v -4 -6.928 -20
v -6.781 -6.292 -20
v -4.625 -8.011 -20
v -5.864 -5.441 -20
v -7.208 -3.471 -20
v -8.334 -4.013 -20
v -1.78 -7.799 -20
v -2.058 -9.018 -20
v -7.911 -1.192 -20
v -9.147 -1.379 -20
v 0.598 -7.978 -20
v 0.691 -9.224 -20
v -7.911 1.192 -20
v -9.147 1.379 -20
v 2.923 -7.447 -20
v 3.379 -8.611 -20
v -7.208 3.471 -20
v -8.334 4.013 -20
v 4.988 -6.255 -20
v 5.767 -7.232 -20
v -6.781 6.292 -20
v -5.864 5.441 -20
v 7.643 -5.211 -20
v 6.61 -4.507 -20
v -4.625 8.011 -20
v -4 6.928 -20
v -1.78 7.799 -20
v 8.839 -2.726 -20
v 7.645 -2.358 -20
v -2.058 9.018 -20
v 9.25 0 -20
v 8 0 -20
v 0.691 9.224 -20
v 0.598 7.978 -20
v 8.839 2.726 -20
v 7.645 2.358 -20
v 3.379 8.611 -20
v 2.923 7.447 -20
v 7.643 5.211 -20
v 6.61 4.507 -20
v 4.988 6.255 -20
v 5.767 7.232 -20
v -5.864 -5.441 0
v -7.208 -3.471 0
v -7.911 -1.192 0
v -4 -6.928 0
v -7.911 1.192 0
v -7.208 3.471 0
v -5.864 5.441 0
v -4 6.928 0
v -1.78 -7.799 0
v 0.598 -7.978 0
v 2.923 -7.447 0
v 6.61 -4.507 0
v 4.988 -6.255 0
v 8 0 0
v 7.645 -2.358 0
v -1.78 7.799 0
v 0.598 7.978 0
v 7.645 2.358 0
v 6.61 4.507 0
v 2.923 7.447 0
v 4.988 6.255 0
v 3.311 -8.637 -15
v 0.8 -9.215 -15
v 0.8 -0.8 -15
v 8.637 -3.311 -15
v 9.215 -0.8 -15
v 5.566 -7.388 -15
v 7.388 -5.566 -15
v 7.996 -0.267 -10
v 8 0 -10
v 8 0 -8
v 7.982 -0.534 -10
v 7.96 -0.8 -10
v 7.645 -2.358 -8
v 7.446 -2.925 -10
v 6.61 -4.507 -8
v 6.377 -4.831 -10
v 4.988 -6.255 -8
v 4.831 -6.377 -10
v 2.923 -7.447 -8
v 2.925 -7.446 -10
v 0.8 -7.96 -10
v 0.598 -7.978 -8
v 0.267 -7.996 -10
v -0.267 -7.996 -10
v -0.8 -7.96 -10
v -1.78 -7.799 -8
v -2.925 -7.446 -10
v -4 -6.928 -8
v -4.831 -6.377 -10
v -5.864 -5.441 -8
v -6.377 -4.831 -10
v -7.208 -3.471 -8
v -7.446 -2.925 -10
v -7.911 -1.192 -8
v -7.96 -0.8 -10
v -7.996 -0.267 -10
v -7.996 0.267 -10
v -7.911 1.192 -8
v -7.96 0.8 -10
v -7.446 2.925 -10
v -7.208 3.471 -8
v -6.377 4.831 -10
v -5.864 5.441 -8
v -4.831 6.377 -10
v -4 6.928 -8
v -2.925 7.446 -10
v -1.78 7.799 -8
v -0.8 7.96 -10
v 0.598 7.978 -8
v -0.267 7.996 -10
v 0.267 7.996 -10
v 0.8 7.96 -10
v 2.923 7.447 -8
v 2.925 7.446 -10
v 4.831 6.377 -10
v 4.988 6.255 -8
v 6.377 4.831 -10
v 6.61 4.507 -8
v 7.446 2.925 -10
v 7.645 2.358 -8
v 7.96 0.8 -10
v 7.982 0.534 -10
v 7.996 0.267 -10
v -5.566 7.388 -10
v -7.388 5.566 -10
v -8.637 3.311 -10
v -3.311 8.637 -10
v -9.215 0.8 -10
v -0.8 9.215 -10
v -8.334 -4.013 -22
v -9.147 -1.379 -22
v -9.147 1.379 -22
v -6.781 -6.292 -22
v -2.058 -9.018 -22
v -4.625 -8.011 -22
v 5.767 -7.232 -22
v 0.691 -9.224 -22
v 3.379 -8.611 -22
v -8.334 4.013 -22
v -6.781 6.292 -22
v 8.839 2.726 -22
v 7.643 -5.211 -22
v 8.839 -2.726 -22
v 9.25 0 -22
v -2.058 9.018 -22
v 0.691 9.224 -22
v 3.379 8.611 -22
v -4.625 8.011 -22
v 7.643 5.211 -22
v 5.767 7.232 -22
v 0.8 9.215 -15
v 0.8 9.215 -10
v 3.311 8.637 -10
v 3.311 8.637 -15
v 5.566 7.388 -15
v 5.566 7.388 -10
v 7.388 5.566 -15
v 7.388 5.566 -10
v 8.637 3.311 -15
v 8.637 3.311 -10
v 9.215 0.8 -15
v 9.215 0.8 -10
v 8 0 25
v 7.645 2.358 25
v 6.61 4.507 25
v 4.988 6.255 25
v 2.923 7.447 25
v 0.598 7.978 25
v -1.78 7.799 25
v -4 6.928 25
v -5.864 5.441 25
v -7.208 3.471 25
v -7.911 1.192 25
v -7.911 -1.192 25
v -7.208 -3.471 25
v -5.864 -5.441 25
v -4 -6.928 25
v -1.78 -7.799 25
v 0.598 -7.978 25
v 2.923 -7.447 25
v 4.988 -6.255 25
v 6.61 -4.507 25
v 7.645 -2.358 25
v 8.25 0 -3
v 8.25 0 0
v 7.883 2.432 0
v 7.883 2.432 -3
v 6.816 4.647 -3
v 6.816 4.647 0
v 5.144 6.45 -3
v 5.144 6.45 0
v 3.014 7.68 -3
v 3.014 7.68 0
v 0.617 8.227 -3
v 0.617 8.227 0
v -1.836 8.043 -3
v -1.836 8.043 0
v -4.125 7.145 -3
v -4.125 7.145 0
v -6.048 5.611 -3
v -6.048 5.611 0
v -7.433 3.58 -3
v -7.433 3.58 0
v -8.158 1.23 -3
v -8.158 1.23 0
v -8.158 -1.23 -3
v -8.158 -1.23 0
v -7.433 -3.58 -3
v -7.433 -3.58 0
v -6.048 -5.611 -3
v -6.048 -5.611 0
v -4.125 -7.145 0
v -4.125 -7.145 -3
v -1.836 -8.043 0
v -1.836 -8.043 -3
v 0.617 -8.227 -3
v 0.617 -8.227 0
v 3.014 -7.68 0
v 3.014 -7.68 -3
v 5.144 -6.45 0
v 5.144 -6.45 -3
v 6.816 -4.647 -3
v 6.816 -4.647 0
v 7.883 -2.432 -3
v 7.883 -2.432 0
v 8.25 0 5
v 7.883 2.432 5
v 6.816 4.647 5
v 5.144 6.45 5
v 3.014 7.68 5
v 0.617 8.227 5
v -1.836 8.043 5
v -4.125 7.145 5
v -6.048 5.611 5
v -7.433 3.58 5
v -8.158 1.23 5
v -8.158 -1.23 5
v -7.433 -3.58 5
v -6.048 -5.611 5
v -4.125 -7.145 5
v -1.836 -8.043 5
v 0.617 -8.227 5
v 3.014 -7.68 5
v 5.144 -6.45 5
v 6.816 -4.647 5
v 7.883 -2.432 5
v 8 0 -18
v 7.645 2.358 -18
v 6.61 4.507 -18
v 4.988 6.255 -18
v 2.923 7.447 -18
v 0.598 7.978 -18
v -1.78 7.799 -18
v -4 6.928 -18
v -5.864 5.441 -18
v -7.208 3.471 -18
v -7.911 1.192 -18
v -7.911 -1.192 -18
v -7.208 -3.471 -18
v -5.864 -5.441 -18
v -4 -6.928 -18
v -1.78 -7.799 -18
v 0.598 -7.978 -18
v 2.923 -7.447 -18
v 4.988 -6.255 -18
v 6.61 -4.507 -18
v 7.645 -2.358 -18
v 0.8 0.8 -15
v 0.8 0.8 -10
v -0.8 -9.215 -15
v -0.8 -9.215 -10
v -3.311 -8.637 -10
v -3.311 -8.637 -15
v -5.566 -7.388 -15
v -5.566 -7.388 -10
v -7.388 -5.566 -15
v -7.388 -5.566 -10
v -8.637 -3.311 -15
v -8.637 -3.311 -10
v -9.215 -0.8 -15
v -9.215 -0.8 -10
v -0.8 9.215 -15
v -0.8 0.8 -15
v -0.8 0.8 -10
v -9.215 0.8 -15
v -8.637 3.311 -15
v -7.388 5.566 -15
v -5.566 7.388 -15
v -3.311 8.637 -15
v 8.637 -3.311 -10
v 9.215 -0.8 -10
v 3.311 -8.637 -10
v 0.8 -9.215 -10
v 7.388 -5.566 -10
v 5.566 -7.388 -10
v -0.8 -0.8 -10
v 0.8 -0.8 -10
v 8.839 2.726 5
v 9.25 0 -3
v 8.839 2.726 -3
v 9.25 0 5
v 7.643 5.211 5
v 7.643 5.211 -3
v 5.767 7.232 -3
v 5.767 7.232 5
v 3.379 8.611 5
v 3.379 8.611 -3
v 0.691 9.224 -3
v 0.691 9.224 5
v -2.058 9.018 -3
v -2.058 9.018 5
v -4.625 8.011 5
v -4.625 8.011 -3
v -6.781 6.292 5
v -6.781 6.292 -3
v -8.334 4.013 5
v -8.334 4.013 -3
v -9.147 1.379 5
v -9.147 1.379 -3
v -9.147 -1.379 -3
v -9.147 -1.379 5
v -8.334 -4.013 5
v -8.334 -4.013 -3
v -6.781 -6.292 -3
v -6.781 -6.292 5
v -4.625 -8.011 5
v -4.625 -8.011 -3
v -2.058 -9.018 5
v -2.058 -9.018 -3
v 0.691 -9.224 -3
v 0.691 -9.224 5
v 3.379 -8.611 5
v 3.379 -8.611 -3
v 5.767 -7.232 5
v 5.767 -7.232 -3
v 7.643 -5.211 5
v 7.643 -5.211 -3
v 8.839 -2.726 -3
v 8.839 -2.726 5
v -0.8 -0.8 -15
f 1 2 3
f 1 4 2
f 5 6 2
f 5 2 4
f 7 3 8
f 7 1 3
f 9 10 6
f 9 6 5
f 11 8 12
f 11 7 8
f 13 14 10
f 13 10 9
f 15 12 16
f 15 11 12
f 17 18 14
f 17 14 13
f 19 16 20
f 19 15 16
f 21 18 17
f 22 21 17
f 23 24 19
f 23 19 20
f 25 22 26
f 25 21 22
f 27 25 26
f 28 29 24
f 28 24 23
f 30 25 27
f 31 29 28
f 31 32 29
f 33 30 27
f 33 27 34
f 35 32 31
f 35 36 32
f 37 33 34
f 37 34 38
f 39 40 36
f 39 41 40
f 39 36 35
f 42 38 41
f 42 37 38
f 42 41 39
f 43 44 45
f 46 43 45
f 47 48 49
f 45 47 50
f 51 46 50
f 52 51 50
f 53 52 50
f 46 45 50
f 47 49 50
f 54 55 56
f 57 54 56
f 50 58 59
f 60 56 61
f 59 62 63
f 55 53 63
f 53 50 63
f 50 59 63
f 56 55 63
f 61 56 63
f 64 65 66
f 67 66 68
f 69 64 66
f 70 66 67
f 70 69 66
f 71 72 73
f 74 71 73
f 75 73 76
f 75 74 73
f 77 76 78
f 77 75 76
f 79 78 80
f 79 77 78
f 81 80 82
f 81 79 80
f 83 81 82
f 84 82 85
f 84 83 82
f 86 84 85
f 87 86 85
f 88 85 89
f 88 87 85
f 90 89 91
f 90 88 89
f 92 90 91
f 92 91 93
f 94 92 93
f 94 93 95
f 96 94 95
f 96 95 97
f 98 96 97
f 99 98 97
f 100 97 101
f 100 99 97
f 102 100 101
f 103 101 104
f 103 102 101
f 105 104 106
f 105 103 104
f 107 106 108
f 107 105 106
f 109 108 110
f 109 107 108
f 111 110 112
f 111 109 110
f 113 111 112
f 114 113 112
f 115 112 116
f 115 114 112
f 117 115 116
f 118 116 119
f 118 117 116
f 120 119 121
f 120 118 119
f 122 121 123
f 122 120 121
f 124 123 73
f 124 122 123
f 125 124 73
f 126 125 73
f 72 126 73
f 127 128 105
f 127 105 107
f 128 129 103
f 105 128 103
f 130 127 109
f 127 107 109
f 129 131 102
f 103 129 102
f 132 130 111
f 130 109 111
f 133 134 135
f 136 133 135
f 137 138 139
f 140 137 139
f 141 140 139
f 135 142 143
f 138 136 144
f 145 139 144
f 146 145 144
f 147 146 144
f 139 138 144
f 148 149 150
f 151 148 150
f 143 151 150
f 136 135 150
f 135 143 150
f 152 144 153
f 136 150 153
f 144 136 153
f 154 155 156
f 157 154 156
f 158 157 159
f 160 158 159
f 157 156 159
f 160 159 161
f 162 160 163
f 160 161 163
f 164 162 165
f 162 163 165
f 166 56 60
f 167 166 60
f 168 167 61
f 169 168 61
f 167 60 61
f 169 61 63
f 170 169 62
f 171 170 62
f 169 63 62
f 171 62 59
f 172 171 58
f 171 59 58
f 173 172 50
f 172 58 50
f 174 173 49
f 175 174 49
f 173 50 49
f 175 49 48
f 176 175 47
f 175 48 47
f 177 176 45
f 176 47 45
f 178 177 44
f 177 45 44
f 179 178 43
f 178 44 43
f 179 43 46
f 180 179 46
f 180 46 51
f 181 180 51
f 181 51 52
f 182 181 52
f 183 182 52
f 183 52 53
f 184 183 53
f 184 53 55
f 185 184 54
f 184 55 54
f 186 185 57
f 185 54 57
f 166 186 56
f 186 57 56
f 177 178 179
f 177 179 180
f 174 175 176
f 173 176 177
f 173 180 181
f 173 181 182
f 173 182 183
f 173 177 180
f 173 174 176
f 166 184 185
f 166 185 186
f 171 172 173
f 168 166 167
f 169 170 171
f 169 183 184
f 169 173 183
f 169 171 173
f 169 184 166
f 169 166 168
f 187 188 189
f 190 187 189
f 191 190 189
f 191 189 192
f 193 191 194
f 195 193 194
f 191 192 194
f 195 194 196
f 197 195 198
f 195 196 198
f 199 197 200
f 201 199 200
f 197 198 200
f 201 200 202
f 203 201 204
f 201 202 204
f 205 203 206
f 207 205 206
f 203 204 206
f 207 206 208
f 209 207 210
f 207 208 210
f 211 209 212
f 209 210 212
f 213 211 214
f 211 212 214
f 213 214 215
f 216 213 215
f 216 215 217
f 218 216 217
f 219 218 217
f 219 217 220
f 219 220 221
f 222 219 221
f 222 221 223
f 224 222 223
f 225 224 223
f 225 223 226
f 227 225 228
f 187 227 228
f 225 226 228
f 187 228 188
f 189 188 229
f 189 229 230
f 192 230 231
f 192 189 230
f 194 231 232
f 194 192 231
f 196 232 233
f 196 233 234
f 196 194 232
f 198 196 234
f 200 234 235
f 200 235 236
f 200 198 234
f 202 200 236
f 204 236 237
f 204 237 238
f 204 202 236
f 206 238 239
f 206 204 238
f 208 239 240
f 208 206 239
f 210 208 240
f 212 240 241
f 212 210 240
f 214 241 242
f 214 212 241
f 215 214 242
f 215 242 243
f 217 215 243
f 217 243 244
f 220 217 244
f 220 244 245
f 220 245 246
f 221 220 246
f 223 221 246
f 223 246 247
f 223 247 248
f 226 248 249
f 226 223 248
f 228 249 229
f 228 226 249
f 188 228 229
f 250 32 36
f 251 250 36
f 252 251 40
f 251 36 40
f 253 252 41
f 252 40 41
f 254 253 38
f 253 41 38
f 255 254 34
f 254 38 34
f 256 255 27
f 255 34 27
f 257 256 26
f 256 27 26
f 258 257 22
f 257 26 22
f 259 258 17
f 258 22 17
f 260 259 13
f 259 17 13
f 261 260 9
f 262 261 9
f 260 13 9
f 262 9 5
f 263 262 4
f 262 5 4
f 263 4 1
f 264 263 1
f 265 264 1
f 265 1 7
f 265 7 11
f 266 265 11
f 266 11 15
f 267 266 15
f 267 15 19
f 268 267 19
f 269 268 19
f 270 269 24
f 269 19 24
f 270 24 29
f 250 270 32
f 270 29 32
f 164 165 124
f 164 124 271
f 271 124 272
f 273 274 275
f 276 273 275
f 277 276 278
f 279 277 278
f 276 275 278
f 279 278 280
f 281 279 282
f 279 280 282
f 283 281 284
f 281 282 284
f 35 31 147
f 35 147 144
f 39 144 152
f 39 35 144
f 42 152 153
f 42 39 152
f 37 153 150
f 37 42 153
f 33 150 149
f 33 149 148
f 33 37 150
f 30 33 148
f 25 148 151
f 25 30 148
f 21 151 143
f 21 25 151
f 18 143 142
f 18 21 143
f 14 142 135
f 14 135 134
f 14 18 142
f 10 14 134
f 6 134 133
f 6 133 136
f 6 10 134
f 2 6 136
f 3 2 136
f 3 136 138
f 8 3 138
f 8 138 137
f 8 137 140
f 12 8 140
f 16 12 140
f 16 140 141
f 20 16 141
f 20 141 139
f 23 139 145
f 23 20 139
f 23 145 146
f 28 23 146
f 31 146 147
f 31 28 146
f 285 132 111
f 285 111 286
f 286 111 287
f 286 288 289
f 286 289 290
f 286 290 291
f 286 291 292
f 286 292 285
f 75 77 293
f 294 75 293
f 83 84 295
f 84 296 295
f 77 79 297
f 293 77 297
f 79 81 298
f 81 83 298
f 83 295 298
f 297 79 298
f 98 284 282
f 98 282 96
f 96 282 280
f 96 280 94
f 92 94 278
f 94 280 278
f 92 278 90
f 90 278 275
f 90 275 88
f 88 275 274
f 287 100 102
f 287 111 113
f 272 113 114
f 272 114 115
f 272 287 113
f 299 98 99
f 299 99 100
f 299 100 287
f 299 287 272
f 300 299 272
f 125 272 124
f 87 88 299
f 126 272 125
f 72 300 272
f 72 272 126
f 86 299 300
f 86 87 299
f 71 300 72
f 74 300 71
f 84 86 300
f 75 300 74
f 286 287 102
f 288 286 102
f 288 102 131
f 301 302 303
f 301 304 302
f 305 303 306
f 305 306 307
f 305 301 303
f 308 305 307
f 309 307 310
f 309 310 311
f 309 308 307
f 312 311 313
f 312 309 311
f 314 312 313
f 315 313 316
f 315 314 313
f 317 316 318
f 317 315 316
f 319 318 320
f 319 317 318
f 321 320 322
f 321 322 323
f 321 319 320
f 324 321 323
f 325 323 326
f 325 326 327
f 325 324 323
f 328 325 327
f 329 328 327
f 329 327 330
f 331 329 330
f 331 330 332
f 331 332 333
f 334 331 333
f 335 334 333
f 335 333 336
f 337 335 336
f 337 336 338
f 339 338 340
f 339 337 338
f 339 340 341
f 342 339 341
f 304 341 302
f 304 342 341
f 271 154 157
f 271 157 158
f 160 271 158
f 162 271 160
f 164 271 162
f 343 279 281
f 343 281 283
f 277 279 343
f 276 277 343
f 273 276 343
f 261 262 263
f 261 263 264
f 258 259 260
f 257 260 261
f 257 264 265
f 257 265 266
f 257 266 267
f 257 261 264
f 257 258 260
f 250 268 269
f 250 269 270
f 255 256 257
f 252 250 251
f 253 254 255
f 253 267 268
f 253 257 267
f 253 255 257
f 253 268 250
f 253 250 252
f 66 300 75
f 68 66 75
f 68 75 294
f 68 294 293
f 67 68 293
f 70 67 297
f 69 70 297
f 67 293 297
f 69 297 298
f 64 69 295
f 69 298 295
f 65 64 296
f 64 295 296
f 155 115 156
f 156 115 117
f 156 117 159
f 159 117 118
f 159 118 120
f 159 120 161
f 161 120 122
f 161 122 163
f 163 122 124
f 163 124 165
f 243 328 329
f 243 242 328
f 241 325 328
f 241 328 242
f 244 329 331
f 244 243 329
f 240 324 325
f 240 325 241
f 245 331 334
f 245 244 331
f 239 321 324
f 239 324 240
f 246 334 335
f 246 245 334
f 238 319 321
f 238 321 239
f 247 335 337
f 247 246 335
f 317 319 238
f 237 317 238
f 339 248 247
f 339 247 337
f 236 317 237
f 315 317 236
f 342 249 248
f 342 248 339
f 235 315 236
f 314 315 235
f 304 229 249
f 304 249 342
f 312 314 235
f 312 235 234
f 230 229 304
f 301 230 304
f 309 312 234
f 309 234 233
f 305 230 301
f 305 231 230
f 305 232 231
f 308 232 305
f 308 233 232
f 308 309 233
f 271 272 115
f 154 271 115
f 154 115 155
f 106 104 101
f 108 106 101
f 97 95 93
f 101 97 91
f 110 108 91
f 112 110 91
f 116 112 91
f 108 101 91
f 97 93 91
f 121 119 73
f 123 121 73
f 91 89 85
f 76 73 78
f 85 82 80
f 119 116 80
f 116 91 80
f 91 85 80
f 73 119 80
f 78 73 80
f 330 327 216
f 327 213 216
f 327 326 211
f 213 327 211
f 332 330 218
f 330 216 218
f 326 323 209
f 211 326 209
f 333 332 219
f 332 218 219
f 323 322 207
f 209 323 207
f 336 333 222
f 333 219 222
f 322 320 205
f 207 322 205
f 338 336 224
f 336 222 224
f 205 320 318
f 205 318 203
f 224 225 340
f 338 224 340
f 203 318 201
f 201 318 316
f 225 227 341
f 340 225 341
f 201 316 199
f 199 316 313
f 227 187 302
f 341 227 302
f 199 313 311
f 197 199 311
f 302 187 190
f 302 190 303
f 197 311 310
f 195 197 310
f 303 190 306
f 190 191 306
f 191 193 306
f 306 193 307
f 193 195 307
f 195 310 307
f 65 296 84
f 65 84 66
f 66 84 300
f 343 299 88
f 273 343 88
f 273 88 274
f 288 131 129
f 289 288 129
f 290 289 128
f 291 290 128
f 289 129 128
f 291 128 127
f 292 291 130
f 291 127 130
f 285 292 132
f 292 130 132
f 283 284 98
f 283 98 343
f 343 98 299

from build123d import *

# Parameters (mm, degrees)
F0_R          = 8
F1_DEPTH      = 25
F2_R          = 9.25
F2_R_2        = 8.25
F3_DEPTH      = 5
F3_DEPTH_BACK = 3
F5_R          = 8
F6_DEPTH      = 2
F8_DEPTH      = 5
F10_R         = 8
F11_DEPTH     = 2
F10_R_2       = 9.25
F12_DEPTH     = 2


with BuildPart() as f1:
    # F0 (on Top) → F1 (new body)
    with BuildSketch(Plane.XY):
        Circle(F0_R)
    extrude(amount=F1_DEPTH)


with BuildPart() as f3:
    # F2 (on Top) → F3 (new body, two sides)
    with BuildSketch(Plane.XY) as f3_sk:
        Circle(F2_R)
        Circle(F2_R_2, mode=Mode.SUBTRACT)
    extrude(amount=F3_DEPTH)
    extrude(f3_sk.sketch, amount=-F3_DEPTH_BACK)


with BuildPart() as f6:
    # F5 (on offset) → F6 (new body)
    with BuildSketch(Plane(origin=(0, 0, -10), x_dir=(1, 0, 0), z_dir=(0, 0, -1))):
        Circle(F5_R)
    extrude(amount=-F6_DEPTH)

    # F7 (on offset) → F8 (join)
    with BuildSketch(Plane(origin=(0, 0, -10), x_dir=(1, 0, 0), z_dir=(0, 0, -1))):
        with BuildLine():
            Line((-0.8, 0.8), (-0.8, 9.2153404712))
            ThreePointArc((-0.8, 9.2153404712), (-6.540737726, 6.540737726), (-9.2153404712, 0.8))
            Line((-9.2153404712, 0.8), (-0.8, 0.8))
        make_face()
        with BuildLine():
            Line((0.8, 0.8), (9.2153404712, 0.8))
            ThreePointArc((9.2153404712, 0.8), (6.540737726, 6.540737726), (0.8, 9.2153404712))
            Line((0.8, 9.2153404712), (0.8, 0.8))
        make_face()
        with BuildLine():
            ThreePointArc((-9.2153404712, -0.8), (-6.540737726, -6.540737726), (-0.8, -9.2153404712))
            Line((-0.8, -9.2153404712), (-0.8, -0.8))
            Line((-0.8, -0.8), (-9.2153404712, -0.8))
        make_face()
        with BuildLine():
            ThreePointArc((0.8, -9.2153404712), (6.540737726, -6.540737726), (9.2153404712, -0.8))
            Line((9.2153404712, -0.8), (0.8, -0.8))
            Line((0.8, -0.8), (0.8, -9.2153404712))
        make_face()
    extrude(amount=F8_DEPTH)


with BuildPart() as f11:
    # F10 (on offset) → F11 (new body)
    with BuildSketch(Plane.XY.offset(-20)):
        Circle(F10_R)
    extrude(amount=F11_DEPTH)

    # F10 (on offset) → F12 (join)
    with BuildSketch(Plane.XY.offset(-20)):
        Circle(F10_R_2)
        Circle(F10_R, mode=Mode.SUBTRACT)
        Circle(F10_R)
    extrude(amount=-F12_DEPTH)


solid = Compound([f1.part, f3.part, f6.part, f11.part])
